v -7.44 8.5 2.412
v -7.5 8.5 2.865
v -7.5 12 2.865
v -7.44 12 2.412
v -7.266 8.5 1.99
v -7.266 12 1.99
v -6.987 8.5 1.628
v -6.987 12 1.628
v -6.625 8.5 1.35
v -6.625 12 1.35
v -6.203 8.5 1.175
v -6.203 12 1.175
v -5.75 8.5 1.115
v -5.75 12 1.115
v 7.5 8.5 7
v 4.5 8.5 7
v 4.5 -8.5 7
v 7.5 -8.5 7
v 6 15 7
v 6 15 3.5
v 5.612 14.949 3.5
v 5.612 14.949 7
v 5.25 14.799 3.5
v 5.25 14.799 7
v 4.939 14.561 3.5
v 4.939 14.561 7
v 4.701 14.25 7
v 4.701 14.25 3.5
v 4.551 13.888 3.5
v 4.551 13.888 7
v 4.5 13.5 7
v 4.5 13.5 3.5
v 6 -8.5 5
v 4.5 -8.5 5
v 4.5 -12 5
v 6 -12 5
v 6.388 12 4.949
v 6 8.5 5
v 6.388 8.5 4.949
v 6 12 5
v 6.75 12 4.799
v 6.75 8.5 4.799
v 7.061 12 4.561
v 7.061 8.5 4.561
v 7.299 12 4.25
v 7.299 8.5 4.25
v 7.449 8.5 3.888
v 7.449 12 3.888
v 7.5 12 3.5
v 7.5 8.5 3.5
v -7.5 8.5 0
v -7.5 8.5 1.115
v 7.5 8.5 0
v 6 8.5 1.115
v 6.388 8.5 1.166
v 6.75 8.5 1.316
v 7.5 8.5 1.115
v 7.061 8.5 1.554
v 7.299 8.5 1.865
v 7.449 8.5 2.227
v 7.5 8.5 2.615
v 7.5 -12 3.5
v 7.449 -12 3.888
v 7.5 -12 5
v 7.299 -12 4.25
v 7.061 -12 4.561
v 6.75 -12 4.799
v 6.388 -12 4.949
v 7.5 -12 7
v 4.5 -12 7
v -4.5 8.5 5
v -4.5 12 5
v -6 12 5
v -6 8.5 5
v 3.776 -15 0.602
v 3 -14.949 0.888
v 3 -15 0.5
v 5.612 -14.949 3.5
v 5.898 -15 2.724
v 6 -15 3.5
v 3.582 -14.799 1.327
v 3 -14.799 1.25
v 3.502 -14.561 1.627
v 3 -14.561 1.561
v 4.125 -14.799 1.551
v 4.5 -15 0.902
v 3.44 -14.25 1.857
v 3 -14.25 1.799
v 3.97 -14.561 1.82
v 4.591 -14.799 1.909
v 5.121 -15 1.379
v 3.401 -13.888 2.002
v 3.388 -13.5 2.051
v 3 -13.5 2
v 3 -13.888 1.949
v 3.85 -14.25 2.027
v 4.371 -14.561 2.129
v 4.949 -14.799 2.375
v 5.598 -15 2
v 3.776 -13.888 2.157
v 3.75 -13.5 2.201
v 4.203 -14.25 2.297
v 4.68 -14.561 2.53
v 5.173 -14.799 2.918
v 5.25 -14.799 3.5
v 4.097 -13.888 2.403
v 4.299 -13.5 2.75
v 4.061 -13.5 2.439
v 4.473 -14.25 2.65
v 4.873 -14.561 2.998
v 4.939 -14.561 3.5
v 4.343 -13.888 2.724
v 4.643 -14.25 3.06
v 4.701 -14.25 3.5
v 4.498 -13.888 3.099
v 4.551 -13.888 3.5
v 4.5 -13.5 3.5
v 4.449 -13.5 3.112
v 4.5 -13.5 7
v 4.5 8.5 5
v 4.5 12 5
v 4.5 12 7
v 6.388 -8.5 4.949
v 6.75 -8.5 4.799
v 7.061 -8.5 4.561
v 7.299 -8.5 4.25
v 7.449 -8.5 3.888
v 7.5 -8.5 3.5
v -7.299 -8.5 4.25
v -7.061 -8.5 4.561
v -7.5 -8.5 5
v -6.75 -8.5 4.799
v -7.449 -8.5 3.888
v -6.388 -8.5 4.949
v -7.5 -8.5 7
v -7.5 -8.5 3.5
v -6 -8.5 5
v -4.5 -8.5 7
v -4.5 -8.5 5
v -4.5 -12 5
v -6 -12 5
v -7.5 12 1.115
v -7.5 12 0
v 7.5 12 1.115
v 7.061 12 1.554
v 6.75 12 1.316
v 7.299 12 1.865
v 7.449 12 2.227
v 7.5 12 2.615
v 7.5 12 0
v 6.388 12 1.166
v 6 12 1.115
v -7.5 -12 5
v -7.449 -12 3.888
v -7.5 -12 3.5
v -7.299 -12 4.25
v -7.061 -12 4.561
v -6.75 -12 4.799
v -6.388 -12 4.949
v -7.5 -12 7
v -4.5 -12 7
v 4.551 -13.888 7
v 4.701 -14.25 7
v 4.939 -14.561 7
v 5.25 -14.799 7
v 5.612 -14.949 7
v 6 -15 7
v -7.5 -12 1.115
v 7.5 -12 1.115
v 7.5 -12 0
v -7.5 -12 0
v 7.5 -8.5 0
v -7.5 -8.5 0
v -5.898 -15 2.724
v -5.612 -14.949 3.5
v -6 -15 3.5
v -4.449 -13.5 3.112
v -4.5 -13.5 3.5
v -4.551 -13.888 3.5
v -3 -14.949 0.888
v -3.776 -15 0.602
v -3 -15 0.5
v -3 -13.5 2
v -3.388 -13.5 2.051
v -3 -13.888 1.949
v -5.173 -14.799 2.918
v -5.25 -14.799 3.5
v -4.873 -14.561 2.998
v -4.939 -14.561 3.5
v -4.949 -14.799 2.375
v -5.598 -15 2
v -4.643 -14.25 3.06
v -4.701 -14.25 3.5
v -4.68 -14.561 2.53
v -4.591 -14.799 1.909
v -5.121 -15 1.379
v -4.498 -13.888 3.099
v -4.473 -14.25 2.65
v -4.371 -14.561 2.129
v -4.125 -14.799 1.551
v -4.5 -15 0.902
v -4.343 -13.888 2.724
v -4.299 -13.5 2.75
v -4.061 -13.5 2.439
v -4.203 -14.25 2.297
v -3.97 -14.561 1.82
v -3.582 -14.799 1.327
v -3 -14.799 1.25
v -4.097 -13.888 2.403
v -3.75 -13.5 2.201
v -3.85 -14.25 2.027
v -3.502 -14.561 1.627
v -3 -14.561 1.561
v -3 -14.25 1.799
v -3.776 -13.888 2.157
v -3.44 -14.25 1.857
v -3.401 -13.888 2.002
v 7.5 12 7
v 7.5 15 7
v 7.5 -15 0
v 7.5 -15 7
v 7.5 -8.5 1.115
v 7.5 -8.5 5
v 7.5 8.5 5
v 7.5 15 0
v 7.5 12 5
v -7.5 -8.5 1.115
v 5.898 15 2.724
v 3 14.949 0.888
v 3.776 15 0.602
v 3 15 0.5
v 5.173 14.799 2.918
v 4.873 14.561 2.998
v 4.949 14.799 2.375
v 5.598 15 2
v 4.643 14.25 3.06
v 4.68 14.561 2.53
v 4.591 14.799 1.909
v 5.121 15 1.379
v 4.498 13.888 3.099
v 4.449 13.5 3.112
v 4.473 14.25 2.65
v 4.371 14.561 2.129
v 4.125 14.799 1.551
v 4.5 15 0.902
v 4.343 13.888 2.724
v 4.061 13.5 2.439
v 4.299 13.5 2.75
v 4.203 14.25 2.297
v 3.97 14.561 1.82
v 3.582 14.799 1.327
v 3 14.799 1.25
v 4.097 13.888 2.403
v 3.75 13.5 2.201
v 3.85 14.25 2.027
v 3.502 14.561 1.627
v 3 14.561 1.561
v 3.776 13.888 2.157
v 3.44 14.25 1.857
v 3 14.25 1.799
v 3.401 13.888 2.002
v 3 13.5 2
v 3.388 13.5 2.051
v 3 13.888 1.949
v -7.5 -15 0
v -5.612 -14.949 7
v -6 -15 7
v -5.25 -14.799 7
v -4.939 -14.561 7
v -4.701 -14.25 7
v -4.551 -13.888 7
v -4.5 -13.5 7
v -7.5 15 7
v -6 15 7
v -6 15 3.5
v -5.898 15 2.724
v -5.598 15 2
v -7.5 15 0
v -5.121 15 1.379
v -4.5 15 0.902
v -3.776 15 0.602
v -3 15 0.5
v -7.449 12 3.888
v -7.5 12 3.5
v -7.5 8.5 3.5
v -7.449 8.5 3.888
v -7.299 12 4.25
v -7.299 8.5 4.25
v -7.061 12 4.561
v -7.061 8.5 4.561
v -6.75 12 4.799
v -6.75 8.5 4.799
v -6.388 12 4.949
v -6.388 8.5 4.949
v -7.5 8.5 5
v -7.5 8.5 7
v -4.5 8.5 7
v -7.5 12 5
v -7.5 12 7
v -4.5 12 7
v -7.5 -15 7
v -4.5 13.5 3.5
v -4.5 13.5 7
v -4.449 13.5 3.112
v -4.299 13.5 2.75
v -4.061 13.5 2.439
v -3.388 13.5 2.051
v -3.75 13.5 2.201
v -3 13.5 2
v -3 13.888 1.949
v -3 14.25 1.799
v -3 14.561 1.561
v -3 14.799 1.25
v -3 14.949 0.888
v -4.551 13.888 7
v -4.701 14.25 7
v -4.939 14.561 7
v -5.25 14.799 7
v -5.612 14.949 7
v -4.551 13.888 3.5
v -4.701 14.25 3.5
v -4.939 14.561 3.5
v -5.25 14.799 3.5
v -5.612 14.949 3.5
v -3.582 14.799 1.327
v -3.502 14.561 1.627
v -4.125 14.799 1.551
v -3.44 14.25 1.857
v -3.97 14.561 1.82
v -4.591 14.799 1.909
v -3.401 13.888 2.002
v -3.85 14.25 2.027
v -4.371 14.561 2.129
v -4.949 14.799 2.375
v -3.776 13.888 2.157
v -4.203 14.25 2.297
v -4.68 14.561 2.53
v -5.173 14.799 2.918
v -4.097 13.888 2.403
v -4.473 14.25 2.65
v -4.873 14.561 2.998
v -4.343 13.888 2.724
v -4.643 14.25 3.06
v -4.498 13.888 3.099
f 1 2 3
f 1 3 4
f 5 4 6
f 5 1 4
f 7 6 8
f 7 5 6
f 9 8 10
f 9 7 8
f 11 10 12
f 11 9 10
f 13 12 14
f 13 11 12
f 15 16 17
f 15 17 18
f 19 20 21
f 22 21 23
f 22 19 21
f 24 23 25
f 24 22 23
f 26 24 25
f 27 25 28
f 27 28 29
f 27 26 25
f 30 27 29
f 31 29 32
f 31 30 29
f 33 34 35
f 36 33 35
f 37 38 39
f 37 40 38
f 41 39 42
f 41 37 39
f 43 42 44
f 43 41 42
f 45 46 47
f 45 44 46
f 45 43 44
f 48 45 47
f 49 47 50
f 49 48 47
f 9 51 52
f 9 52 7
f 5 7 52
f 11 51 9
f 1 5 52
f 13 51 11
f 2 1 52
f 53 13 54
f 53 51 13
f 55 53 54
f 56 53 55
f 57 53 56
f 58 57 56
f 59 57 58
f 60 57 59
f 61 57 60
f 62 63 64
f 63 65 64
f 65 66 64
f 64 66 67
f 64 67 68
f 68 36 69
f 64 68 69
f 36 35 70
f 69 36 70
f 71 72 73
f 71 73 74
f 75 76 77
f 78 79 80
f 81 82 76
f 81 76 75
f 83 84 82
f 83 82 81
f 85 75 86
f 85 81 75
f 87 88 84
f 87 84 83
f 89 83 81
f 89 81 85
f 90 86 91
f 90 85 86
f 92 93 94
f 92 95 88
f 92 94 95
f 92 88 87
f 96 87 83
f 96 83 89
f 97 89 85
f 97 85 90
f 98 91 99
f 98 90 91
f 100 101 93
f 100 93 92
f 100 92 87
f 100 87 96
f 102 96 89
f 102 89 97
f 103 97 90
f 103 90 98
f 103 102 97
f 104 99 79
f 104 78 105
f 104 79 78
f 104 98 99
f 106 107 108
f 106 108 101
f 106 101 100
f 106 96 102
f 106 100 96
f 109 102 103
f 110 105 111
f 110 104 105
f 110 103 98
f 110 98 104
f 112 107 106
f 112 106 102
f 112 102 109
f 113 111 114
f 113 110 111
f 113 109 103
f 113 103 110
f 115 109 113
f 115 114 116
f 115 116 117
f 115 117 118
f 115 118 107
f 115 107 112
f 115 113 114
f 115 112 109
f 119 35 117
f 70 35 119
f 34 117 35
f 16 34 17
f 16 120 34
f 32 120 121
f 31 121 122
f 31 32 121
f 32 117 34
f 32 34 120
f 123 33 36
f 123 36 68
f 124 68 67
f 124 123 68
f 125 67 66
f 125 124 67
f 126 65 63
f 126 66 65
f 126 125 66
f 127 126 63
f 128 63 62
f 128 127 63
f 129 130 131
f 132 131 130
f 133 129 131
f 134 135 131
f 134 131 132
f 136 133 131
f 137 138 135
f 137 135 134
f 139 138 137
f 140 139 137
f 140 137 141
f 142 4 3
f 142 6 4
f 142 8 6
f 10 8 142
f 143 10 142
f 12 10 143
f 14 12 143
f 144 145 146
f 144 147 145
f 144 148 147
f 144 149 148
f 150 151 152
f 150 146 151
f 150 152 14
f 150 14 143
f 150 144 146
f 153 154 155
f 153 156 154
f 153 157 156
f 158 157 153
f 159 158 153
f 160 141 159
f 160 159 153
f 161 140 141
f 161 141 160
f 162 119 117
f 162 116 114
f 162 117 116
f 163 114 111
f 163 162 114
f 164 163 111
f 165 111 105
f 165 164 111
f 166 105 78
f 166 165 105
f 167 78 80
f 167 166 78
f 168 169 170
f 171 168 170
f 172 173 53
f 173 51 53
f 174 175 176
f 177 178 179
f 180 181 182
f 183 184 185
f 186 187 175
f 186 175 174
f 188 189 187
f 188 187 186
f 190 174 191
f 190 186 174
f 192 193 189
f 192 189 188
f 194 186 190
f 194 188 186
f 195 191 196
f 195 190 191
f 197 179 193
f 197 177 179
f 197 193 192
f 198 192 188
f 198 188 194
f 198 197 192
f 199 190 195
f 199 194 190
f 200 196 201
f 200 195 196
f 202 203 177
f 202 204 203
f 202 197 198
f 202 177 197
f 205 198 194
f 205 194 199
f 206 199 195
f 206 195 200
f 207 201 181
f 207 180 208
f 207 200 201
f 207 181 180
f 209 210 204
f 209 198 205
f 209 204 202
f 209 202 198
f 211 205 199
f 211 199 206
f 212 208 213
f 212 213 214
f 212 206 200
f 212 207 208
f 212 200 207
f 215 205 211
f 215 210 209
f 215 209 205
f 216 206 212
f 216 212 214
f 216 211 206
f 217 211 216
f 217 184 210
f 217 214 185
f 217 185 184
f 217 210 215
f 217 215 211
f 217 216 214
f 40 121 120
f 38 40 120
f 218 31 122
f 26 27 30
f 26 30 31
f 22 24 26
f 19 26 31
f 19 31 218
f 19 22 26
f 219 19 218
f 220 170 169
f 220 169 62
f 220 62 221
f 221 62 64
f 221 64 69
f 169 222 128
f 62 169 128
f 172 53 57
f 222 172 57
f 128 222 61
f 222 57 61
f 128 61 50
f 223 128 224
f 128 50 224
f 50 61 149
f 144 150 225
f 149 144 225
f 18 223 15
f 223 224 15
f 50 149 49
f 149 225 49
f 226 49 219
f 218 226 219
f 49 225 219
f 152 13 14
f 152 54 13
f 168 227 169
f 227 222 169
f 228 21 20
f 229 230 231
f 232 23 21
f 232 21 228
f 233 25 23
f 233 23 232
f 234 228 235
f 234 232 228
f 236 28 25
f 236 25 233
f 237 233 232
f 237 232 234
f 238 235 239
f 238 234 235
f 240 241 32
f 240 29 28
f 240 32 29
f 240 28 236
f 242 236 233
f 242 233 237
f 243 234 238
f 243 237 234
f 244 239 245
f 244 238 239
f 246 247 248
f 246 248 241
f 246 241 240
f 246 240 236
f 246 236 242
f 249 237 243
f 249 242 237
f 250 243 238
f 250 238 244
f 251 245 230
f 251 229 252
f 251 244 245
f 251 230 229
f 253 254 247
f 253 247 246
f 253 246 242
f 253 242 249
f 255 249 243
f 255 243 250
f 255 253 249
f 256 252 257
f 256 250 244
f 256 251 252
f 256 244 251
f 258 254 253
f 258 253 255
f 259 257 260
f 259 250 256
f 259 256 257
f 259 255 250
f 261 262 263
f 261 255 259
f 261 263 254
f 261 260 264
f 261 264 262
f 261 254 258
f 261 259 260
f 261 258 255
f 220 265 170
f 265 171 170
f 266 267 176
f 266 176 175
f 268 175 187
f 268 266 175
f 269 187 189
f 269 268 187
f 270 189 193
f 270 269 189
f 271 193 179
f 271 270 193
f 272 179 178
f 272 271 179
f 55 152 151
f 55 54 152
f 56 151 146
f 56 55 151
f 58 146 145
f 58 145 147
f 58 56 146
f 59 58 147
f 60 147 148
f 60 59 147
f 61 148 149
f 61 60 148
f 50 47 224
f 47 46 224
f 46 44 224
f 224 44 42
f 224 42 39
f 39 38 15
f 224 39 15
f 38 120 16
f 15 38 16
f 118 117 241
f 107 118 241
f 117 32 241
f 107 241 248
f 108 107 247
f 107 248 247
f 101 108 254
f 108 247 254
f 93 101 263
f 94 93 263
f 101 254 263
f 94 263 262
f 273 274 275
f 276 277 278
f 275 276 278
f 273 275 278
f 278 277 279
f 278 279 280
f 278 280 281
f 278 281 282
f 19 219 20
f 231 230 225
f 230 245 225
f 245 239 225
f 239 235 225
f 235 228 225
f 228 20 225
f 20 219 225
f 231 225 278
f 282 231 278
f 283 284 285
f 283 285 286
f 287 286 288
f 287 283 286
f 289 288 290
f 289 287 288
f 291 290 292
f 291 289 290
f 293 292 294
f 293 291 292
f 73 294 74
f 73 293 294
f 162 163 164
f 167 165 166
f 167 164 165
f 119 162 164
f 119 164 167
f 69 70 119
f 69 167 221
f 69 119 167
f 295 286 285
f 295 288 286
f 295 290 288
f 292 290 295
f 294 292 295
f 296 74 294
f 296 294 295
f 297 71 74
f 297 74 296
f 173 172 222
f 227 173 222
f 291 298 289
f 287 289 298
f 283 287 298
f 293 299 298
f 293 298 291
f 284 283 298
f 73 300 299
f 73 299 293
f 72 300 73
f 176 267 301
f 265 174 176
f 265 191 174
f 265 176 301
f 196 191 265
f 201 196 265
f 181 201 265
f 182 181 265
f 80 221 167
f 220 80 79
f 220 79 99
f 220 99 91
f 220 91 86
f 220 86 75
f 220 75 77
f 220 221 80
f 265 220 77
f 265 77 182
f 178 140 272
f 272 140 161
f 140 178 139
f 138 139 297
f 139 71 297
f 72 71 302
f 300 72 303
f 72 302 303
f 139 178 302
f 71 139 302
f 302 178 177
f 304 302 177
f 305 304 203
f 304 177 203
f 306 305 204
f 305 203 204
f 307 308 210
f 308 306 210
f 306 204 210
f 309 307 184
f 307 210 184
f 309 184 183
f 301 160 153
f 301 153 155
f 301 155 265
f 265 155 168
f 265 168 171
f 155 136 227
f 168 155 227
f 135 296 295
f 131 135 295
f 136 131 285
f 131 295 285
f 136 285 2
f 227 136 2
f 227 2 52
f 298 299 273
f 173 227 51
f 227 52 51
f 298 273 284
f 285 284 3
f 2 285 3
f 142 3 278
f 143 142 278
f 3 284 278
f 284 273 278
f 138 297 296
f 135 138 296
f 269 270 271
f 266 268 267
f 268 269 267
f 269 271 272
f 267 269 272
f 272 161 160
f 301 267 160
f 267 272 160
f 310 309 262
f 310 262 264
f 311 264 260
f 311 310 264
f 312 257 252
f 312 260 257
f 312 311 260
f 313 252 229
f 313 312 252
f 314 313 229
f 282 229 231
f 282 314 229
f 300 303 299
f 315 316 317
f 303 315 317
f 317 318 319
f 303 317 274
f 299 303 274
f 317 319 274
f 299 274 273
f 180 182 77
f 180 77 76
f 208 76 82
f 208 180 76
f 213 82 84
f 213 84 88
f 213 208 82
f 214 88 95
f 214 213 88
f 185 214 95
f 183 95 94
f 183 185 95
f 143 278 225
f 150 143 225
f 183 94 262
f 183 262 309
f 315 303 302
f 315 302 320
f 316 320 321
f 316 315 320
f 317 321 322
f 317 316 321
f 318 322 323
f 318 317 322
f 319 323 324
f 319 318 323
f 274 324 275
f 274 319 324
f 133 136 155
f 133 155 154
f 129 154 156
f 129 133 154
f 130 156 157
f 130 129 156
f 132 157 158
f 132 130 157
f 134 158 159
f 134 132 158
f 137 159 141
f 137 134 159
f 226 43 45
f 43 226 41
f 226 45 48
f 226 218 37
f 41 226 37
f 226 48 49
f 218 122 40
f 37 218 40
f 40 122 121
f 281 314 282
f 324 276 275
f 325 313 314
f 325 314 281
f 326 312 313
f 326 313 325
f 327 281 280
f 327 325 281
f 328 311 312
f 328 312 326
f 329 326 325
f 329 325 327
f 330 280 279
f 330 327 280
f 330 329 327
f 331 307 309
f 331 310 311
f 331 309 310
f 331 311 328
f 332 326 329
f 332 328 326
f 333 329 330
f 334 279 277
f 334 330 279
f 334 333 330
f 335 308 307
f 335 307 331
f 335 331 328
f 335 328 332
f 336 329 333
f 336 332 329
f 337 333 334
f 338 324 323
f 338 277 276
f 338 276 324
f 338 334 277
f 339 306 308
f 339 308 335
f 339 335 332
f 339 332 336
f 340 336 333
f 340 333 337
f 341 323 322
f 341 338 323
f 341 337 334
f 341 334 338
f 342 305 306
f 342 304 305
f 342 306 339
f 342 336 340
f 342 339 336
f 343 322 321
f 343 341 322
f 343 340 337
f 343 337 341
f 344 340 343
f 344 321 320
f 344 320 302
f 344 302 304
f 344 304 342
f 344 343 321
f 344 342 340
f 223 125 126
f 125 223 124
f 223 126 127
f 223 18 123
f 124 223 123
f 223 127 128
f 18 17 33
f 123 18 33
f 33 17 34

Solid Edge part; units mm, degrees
sketch "Sketch1" plane through (0, 0, 0) normal (0, -1, 0) x (1, 0, 0)
  line L0 (7.5, 2) -> (4.5, 2)
  line L1 (4.5, 2) -> (4.5, 7)
  line L2 (4.5, 7) -> (7.5, 7)
  line L3 (7.5, 7) -> (7.5, 2)
  line L4 (-4.5, 2) -> (-4.5, 7)
  line L5 (-4.5, 7) -> (-7.5, 7)
  line L6 (-7.5, 7) -> (-7.5, 2)
  line L7 (-7.5, 2) -> (-4.5, 2)
  line L8 (7.5, 2) -> (-7.5, 2)
  line L9 (-7.5, 2) -> (-7.5, 0)
  line L10 (-7.5, 0) -> (7.5, 0)
  line L11 (7.5, 0) -> (7.5, 2)
  dimension "D1" = 9
  dimension "D2" = 3
  dimension "D3" = 2
  dimension "D4" = 5
extrude "Protrusion1" add sketch "Sketch1" along normal mid plane 30
sketch "Sketch2" plane through (0, 0, 0) normal (1, 0, 0) x (0, 1, 0)
  line L0 (-12, 0) -> (-8.5, 0)
  line L1 (-8.5, 0) -> (-8.5, 1.1151)
  line L2 (-8.5, 1.1151) -> (-12, 1.1151)
  line L3 (-12, 1.1151) -> (-12, 0)
  line L4 (8.5, 5) -> (8.5, 9.3332)
  line L5 (8.5, 9.3332) -> (12, 9.3332)
  line L6 (12, 9.3332) -> (12, 5)
  line L7 (12, 5) -> (8.5, 5)
  line L8 (8.5, 1.1151) -> (12, 1.1151)
  line L9 (12, 1.1151) -> (12, 0)
  line L10 (12, 0) -> (8.5, 0)
  line L11 (8.5, 0) -> (8.5, 1.1151)
  line L12 (-8.5, 9.3332) -> (-8.5, 5)
  line L13 (-8.5, 5) -> (-12, 5)
  line L14 (-12, 5) -> (-12, 9.3332)
  line L15 (-12, 9.3332) -> (-8.5, 9.3332)
  dimension "D1" = 3.5
  dimension "D2" = 1.5
  dimension "D3" = 3
  dimension "D4" = 3
extrude "Cutout1" cut sketch "Sketch2" against normal up to next and the other way up to next
fillet "Round_1" radius 1.75 1 edges at (-7.5, 10.25, 1.1151)
fillet "Round_1" radius 1.5 13 edges at (-4.5, 0, 2) (4.5, 0, 2) (0, 15, 2) (-4.5, 15, 4.5) (4.5, 15, 4.5) (-4.5, -15, 4.5) (4.5, -15, 4.5) (0, -15, 2) (-7.5, -10.25, 5) (7.5, -10.25, 5) (7.5, 10.25, 5) (-7.5, 10.25, 5) (7.5, 10.25, 1.1151)
